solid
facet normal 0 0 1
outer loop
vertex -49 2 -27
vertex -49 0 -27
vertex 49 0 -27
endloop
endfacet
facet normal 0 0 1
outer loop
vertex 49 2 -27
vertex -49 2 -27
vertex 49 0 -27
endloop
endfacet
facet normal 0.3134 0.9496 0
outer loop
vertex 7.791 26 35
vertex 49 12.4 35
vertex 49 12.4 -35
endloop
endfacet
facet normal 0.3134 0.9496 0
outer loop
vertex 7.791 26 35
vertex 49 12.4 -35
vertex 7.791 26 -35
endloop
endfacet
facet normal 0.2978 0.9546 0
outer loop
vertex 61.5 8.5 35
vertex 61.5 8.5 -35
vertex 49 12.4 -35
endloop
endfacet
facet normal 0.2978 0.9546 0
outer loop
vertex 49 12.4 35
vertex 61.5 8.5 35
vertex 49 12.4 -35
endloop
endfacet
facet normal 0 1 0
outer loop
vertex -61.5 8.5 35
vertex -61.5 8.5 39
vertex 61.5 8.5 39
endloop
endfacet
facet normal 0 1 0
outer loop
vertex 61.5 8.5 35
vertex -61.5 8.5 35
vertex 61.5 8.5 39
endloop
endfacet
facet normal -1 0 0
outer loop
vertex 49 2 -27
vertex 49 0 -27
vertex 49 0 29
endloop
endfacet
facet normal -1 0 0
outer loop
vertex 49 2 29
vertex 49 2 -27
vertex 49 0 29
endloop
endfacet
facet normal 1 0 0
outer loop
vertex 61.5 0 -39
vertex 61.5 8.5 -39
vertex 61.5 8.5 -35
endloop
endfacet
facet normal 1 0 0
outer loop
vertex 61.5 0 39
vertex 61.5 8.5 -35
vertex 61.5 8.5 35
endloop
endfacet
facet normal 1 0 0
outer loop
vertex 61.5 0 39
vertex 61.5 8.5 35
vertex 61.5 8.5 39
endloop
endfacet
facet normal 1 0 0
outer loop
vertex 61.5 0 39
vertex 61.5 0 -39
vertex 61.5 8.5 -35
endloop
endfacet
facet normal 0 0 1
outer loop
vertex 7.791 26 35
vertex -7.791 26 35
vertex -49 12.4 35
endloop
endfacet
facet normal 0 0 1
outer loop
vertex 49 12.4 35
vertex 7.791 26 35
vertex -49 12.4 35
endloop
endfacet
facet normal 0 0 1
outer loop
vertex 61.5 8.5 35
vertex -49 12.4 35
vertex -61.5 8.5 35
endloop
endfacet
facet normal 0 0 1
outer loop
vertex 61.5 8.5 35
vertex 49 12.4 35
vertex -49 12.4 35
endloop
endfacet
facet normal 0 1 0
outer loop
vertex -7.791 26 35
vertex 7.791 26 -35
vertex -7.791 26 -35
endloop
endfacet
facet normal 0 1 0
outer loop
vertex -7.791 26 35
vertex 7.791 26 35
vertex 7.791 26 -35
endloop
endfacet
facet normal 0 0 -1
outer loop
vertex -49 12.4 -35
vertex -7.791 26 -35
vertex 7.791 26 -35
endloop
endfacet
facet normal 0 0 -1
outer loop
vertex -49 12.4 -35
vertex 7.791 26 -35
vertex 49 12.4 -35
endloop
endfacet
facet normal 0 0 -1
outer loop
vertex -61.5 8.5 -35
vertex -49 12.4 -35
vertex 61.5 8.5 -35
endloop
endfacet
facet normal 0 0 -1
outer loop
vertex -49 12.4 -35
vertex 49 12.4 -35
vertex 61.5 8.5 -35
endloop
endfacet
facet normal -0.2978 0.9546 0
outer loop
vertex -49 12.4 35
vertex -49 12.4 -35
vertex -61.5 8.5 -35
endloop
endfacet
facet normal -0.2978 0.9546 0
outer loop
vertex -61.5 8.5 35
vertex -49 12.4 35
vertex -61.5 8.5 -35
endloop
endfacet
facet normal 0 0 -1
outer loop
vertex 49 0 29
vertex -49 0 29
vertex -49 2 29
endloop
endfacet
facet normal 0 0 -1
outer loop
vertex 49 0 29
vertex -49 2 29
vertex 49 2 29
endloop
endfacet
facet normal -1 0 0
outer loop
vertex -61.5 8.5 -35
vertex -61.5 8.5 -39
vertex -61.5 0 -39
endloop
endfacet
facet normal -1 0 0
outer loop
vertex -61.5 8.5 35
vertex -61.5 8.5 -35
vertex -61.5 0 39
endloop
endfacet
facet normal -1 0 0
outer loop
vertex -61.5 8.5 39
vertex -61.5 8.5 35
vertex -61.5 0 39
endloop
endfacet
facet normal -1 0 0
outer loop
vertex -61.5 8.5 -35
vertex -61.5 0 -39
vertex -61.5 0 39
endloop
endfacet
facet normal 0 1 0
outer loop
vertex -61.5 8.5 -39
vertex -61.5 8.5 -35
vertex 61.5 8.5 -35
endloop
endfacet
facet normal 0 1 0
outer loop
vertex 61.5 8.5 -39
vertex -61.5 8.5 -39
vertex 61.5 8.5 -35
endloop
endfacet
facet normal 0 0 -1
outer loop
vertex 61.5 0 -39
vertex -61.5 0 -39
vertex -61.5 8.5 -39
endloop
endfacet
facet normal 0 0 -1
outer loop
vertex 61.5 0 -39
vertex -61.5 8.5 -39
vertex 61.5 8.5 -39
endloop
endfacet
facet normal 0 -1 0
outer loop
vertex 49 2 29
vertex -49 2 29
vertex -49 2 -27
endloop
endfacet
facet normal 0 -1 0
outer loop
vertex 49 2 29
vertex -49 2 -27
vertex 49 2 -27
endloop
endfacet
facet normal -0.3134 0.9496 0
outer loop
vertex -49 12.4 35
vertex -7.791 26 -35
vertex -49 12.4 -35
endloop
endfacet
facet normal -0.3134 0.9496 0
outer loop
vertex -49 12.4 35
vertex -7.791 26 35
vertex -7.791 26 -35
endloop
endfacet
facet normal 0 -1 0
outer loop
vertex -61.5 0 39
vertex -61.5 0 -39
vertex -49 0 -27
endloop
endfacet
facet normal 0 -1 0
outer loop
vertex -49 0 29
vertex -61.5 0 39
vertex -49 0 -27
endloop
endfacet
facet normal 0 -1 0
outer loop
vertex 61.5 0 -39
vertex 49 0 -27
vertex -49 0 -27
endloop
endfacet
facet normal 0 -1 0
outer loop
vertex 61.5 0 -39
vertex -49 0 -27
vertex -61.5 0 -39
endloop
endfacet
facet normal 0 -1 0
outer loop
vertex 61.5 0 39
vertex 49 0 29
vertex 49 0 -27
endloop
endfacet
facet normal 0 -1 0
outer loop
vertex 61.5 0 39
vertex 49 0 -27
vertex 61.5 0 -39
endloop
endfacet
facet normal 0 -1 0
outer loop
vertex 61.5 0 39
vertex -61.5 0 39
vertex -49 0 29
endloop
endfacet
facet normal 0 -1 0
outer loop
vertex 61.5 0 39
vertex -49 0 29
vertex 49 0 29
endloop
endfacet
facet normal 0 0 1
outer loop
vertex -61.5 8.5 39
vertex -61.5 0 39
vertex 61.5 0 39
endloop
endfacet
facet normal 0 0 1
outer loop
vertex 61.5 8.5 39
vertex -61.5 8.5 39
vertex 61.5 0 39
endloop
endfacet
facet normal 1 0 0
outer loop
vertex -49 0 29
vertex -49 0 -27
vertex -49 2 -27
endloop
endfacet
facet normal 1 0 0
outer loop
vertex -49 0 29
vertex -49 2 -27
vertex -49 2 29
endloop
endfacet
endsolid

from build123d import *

# Parameters (mm, degrees)
F0_W          = 123
F0_H          = 78
F1_DEPTH      = 8.5
F2_W          = 98
F2_H          = 56
F3_DEPTH      = 2
F5_DEPTH      = 35
F5_DEPTH_BACK = 35


with BuildPart() as f1:
    # F0 (on Front) → F1 (new body)
    with BuildSketch(Plane.XZ):
        Rectangle(F0_W, F0_H)
    extrude(amount=-F1_DEPTH)

    # F2 (on face) → F3 (cut)
    with BuildSketch(Plane.XZ):
        with Locations((0, 1)):
            Rectangle(F2_W, F2_H)
    extrude(amount=-F3_DEPTH, mode=Mode.SUBTRACT)

    # F4 (on Top) → F5 (join, two sides)
    with BuildSketch(Plane.XY) as f5_sk:
        Polygon((-49, 12.4), (-61.5, 8.5), (61.5, 8.5), (49, 12.4), (7.791058, 26), (0, 26), (-7.791058, 26), align=None)
    extrude(amount=F5_DEPTH)
    extrude(f5_sk.sketch, amount=-F5_DEPTH_BACK)


solid = f1.part
